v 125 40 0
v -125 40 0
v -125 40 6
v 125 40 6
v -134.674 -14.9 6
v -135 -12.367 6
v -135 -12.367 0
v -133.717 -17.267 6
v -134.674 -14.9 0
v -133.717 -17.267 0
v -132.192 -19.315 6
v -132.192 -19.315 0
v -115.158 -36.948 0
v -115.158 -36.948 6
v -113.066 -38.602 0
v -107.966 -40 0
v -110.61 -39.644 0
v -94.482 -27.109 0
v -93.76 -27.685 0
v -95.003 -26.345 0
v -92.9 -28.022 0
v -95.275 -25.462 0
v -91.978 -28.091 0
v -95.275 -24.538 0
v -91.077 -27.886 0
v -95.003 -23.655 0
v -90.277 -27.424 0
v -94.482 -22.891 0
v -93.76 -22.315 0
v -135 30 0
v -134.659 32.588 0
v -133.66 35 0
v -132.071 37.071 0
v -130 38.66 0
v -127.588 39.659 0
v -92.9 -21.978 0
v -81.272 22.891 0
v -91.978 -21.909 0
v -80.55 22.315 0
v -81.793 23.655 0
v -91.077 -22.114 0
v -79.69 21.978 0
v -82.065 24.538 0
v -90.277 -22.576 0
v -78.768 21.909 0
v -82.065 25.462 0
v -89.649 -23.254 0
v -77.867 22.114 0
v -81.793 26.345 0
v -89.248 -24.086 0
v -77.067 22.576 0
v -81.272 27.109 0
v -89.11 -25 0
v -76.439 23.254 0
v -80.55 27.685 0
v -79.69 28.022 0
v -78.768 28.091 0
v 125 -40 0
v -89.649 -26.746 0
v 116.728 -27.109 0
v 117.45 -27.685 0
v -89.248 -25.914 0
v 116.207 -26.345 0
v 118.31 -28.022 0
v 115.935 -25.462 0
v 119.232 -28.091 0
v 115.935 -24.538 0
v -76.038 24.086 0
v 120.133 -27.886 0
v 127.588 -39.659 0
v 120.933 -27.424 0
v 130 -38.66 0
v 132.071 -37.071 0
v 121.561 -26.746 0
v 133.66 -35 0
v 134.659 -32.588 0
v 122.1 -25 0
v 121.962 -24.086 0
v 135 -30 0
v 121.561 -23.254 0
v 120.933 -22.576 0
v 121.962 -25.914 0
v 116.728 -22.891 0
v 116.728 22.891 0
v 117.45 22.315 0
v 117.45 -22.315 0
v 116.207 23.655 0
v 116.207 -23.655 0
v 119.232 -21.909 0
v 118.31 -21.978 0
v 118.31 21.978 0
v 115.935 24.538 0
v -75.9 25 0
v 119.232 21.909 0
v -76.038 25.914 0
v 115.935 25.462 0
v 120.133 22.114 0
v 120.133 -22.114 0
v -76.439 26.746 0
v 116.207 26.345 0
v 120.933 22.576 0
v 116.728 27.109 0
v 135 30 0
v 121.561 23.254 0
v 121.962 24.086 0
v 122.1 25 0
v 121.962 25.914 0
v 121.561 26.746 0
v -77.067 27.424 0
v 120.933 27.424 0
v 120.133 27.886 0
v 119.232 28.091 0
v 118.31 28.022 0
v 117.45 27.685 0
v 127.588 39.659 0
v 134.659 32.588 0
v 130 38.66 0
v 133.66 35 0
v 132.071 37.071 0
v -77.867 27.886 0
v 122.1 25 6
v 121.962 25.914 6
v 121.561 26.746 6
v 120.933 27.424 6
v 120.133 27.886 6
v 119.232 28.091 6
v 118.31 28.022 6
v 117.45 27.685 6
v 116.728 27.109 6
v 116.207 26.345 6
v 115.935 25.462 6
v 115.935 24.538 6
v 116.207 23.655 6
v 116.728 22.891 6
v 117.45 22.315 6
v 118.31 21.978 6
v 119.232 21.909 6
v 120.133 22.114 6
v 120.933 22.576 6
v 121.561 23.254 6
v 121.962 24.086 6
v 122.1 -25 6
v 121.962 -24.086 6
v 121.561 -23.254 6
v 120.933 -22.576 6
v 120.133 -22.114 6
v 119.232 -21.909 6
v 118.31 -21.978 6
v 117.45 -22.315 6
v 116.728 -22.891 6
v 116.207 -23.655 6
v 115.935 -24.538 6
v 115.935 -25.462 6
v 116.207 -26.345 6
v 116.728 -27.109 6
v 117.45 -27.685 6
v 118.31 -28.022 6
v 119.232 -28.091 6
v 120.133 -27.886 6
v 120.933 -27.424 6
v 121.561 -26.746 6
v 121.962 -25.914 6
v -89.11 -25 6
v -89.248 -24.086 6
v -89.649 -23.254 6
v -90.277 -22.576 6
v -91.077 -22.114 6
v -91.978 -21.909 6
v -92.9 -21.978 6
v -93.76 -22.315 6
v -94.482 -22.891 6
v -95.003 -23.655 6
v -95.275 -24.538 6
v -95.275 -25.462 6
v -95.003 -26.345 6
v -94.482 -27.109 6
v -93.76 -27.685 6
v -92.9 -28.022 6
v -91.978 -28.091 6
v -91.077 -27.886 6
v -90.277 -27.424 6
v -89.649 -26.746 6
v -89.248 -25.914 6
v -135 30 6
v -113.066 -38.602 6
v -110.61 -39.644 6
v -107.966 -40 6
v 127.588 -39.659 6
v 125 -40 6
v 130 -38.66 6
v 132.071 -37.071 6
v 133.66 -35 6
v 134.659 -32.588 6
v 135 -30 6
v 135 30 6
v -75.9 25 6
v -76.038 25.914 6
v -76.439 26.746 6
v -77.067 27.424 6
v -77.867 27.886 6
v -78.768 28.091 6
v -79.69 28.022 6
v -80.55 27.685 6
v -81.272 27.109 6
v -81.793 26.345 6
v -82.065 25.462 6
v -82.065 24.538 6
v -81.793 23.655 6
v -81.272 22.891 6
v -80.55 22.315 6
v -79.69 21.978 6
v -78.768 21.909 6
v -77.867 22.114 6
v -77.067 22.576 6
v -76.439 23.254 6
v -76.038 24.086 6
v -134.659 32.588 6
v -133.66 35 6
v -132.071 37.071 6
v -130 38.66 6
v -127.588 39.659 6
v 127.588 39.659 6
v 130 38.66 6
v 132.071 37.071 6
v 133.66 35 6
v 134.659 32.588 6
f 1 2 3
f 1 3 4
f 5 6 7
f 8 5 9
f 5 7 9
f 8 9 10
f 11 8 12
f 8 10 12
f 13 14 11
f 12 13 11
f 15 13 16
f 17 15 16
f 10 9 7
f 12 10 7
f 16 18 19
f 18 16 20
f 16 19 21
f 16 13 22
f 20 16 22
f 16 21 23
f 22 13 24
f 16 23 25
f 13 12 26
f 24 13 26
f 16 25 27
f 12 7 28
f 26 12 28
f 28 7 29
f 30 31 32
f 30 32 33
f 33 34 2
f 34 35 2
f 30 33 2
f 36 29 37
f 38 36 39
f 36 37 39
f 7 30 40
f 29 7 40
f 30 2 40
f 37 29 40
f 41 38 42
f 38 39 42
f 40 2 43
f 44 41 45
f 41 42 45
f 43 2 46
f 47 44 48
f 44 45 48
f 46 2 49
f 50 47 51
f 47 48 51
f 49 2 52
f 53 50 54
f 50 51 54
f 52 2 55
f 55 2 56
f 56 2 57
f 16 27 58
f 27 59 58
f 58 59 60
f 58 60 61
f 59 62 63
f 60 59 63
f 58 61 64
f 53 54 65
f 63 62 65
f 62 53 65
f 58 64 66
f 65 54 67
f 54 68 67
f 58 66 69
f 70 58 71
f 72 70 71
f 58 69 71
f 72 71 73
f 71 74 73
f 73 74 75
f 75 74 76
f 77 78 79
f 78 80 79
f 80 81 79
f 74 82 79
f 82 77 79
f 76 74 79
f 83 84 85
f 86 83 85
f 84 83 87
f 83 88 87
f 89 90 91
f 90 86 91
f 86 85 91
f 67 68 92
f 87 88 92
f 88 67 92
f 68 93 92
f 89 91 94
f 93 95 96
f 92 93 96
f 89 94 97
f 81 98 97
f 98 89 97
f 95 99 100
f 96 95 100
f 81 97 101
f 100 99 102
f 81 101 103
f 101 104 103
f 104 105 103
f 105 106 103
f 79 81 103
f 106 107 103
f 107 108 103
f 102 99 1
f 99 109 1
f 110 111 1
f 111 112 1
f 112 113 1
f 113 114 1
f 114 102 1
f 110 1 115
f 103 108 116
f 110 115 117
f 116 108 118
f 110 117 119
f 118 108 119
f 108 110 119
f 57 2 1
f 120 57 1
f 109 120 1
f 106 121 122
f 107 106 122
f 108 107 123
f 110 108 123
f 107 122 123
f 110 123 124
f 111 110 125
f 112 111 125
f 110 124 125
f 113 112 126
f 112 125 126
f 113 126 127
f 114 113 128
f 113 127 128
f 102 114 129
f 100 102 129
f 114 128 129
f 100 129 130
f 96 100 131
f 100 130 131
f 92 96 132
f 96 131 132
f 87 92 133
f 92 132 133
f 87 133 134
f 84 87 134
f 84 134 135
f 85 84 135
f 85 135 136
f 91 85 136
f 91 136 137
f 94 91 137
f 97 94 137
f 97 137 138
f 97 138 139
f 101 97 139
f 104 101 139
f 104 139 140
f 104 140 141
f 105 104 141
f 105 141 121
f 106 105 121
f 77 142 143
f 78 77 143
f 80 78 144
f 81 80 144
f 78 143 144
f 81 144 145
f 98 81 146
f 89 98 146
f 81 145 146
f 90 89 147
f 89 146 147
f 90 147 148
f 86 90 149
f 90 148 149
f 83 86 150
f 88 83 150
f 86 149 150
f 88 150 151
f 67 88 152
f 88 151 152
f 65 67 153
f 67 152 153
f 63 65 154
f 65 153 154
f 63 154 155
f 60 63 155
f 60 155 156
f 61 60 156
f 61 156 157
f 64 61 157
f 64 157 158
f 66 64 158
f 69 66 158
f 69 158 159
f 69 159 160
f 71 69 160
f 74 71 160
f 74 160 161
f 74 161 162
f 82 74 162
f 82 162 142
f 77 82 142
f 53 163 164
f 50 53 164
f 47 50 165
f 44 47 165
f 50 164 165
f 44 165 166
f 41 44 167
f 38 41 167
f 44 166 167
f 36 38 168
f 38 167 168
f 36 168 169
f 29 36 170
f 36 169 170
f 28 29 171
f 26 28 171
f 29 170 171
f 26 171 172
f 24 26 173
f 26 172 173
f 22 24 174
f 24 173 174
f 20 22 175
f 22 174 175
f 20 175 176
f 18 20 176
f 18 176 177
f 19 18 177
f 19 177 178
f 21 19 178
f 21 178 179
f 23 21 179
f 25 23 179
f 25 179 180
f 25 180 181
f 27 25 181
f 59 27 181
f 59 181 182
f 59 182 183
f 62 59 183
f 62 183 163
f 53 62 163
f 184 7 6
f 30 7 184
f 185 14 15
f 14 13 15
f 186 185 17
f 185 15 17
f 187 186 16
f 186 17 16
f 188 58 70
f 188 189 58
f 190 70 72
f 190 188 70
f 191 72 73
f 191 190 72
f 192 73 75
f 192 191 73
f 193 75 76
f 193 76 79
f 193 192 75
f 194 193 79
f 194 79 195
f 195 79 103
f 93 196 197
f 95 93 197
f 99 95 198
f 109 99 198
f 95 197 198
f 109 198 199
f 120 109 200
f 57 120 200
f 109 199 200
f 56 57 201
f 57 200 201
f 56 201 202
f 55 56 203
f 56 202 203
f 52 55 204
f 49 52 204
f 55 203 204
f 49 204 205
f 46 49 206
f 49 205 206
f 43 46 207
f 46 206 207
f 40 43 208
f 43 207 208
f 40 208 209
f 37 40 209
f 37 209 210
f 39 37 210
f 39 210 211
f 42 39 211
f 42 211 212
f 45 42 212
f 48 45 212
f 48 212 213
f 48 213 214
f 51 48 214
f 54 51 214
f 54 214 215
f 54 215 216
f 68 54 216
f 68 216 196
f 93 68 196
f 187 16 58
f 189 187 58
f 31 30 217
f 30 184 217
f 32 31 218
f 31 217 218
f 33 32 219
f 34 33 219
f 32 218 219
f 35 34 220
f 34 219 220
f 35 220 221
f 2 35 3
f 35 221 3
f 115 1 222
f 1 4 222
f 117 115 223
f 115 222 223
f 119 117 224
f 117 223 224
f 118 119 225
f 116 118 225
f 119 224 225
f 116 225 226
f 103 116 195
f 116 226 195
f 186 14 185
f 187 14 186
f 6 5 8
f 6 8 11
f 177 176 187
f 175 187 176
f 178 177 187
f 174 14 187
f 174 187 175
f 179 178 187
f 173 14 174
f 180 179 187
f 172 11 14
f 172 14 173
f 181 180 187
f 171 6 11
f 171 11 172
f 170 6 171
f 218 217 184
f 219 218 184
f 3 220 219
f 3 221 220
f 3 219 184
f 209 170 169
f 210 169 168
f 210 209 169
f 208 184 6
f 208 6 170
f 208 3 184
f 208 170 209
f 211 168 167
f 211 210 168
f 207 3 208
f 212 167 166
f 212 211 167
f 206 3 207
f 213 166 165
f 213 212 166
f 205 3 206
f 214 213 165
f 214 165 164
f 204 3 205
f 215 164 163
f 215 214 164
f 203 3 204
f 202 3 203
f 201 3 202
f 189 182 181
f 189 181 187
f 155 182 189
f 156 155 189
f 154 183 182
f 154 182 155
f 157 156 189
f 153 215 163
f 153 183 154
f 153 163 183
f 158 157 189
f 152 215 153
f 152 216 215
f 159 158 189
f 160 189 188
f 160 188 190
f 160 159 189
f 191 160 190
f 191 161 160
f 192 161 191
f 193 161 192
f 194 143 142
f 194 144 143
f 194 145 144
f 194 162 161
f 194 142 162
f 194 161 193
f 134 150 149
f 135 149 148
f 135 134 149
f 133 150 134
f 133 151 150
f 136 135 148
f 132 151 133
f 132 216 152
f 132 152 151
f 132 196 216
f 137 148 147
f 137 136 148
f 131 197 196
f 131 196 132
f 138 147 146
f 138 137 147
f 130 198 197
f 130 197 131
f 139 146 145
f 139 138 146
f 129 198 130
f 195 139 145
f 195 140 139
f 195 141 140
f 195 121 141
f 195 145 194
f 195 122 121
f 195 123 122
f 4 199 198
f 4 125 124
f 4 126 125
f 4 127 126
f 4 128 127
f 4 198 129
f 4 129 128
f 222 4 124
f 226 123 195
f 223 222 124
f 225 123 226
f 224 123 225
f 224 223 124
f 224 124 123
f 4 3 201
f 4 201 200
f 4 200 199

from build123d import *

# Parameters (mm, degrees)
SKETCH1_W           = 270
SKETCH1_H           = 80
BOSS_EXTRUDE1_DEPTH = 6
SKETCH2_R           = 3.1
CUT_EXTRUDE1_DEPTH  = 141.929060169
FILLET1_R           = 10
CUT_EXTRUDE2_DEPTH  = 10
FILLET2_R           = 10


with BuildPart() as part:
    # Sketch1 → Boss-Extrude1 (new body)
    with BuildSketch(Plane.XY):
        Rectangle(SKETCH1_W, SKETCH1_H)
    extrude(amount=BOSS_EXTRUDE1_DEPTH)

    # Sketch2 → Cut-Extrude1 (cut, through all)
    with BuildSketch(Plane.XY.offset(6)):
        with Locations((-79, 25)):
            Circle(SKETCH2_R)
        with Locations((119, 25)):
            Circle(SKETCH2_R)
        with Locations((119, -25)):
            Circle(SKETCH2_R)
        with Locations((-92.21, -25)):
            Circle(SKETCH2_R)
    extrude(amount=-CUT_EXTRUDE1_DEPTH, mode=Mode.SUBTRACT)

    # Fillet1
    fillet1_edges = [part.edges().sort_by_distance(p)[0] for p in [
        (135, -40, 3),
        (-135, -40, 3),
        (-135, 40, 3),
        (135, 40, 3),
    ]]
    fillet(fillet1_edges, radius=FILLET1_R)

    # Sketch3 → Cut-Extrude2 (cut)
    with BuildSketch(Plane.XY.offset(6)):
        Polygon((-112.21, -40), (-154.206287839, 3.47324229), (-156.168985045, -56.555388838), (-112.21, -57.992672605), align=None)
    extrude(amount=-CUT_EXTRUDE2_DEPTH, mode=Mode.SUBTRACT)

    # Fillet2
    fillet2_edges = [part.edges().sort_by_distance(p)[0] for p in [
        (-135, -16.408505543, 3),
        (-112.21, -40, 3),
    ]]
    fillet(fillet2_edges, radius=FILLET2_R)


solid = part.part
